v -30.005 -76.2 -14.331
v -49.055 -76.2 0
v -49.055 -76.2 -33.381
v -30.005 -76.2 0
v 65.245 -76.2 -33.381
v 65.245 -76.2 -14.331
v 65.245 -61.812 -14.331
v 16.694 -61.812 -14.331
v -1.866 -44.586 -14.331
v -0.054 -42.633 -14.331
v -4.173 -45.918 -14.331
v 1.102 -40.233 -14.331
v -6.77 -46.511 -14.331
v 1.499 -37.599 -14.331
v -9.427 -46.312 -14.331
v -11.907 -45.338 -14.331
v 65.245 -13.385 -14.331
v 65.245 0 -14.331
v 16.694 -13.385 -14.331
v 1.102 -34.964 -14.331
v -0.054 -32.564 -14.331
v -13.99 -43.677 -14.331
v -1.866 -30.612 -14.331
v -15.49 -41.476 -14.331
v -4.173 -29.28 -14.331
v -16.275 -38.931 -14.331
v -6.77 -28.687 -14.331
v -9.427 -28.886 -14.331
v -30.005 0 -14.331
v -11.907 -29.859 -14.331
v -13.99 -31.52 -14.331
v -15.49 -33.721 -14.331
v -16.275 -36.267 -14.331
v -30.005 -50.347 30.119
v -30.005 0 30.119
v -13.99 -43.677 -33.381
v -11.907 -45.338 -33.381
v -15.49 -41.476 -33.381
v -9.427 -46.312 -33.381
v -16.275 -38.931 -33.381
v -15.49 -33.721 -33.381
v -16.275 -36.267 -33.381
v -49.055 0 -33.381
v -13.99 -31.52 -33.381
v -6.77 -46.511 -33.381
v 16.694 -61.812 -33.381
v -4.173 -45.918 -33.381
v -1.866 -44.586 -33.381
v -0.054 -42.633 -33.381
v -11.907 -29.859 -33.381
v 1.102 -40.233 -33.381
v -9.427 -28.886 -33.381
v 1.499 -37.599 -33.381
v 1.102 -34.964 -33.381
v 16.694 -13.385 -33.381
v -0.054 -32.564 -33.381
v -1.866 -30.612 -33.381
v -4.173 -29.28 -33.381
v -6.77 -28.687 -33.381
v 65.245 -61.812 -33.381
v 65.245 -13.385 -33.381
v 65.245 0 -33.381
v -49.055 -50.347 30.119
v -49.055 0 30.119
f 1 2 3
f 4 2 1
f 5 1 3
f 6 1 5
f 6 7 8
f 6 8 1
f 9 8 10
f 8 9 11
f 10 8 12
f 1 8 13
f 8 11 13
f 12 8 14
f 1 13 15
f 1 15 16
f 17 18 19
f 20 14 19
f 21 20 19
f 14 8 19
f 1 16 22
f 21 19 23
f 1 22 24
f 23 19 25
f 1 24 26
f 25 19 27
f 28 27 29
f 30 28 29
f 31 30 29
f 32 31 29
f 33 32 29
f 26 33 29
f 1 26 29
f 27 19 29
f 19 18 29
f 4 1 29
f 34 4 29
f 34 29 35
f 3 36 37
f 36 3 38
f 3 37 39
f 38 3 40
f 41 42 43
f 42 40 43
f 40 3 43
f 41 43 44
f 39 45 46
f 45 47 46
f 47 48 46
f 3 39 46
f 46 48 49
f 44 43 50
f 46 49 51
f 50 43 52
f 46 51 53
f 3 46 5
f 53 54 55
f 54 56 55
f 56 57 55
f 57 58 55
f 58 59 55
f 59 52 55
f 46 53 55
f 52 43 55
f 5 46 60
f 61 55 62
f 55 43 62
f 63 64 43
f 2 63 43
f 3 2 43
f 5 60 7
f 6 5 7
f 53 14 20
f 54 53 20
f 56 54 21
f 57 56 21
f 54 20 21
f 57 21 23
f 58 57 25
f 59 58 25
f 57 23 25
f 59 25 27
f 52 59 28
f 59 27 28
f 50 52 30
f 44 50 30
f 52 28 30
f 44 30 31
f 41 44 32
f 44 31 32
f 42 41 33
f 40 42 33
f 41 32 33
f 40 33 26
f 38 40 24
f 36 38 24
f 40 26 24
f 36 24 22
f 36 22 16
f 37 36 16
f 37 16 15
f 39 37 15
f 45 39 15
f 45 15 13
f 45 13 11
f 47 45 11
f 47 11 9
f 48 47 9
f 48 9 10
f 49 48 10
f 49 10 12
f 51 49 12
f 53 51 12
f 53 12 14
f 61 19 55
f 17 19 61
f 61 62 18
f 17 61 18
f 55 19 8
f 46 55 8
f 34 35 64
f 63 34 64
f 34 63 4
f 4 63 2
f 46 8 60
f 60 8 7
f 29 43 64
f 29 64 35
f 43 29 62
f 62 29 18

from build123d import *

# Parameters (mm, degrees)
F1_DEPTH = 76.2
F4_DEPTH = 114.301
F5_DEPTH = 114.301
F6_W     = 48.55076
F6_H     = 23.712237
F6_H_2   = 24.714869
F7_DEPTH = 19.051
F8_R     = 8.936908
F9_DEPTH = 19.051


with BuildPart() as f1:
    # F0 (on Front) → F1 (new body)
    with BuildSketch(Plane.XZ):
        Polygon((-30.005424, 30.119236), (-49.055424, 30.119236), (-49.055424, -33.380764), (65.244576, -33.380764), (65.244576, -14.330764), (-30.005424, -14.330764), align=None)
    extrude(amount=F1_DEPTH)

    # F3 (on face) → F4 (cut, through all)
    with BuildSketch(Plane(origin=(-49.055424, 0, 0), x_dir=(0, -1, 0), z_dir=(-1, 0, 0))):
        Polygon((76.2, 0), (76.2, 30.119236), (50.347358, 30.119236), align=None)
    extrude(amount=-F4_DEPTH, mode=Mode.SUBTRACT)

    # F2 (on face) → F5 (cut, through all)
    with BuildSketch(Plane(origin=(-49.055424, 0, 0), x_dir=(0, -1, 0), z_dir=(-1, 0, 0))):
        Polygon((76.2, 30.119236), (50.347358, 30.119236), (76.2, 0), align=None)
    extrude(amount=-F5_DEPTH, mode=Mode.SUBTRACT)

    # F6 (on face) → F7 (cut, through all)
    with BuildSketch(Plane.XY.offset(-14.330764)):
        with Locations((40.969196, -49.956119)):
            Rectangle(F6_W, F6_H)
        with Locations((40.969196, -25.742566)):
            Rectangle(F6_W, F6_H_2)
    extrude(amount=-F7_DEPTH, mode=Mode.SUBTRACT)

    # F8 (on face) → F9 (cut, through all)
    with BuildSketch(Plane.XY.offset(-14.330764)):
        with Locations((-7.438298, -37.598684)):
            Circle(F8_R)
    extrude(amount=-F9_DEPTH, mode=Mode.SUBTRACT)


solid = f1.part
